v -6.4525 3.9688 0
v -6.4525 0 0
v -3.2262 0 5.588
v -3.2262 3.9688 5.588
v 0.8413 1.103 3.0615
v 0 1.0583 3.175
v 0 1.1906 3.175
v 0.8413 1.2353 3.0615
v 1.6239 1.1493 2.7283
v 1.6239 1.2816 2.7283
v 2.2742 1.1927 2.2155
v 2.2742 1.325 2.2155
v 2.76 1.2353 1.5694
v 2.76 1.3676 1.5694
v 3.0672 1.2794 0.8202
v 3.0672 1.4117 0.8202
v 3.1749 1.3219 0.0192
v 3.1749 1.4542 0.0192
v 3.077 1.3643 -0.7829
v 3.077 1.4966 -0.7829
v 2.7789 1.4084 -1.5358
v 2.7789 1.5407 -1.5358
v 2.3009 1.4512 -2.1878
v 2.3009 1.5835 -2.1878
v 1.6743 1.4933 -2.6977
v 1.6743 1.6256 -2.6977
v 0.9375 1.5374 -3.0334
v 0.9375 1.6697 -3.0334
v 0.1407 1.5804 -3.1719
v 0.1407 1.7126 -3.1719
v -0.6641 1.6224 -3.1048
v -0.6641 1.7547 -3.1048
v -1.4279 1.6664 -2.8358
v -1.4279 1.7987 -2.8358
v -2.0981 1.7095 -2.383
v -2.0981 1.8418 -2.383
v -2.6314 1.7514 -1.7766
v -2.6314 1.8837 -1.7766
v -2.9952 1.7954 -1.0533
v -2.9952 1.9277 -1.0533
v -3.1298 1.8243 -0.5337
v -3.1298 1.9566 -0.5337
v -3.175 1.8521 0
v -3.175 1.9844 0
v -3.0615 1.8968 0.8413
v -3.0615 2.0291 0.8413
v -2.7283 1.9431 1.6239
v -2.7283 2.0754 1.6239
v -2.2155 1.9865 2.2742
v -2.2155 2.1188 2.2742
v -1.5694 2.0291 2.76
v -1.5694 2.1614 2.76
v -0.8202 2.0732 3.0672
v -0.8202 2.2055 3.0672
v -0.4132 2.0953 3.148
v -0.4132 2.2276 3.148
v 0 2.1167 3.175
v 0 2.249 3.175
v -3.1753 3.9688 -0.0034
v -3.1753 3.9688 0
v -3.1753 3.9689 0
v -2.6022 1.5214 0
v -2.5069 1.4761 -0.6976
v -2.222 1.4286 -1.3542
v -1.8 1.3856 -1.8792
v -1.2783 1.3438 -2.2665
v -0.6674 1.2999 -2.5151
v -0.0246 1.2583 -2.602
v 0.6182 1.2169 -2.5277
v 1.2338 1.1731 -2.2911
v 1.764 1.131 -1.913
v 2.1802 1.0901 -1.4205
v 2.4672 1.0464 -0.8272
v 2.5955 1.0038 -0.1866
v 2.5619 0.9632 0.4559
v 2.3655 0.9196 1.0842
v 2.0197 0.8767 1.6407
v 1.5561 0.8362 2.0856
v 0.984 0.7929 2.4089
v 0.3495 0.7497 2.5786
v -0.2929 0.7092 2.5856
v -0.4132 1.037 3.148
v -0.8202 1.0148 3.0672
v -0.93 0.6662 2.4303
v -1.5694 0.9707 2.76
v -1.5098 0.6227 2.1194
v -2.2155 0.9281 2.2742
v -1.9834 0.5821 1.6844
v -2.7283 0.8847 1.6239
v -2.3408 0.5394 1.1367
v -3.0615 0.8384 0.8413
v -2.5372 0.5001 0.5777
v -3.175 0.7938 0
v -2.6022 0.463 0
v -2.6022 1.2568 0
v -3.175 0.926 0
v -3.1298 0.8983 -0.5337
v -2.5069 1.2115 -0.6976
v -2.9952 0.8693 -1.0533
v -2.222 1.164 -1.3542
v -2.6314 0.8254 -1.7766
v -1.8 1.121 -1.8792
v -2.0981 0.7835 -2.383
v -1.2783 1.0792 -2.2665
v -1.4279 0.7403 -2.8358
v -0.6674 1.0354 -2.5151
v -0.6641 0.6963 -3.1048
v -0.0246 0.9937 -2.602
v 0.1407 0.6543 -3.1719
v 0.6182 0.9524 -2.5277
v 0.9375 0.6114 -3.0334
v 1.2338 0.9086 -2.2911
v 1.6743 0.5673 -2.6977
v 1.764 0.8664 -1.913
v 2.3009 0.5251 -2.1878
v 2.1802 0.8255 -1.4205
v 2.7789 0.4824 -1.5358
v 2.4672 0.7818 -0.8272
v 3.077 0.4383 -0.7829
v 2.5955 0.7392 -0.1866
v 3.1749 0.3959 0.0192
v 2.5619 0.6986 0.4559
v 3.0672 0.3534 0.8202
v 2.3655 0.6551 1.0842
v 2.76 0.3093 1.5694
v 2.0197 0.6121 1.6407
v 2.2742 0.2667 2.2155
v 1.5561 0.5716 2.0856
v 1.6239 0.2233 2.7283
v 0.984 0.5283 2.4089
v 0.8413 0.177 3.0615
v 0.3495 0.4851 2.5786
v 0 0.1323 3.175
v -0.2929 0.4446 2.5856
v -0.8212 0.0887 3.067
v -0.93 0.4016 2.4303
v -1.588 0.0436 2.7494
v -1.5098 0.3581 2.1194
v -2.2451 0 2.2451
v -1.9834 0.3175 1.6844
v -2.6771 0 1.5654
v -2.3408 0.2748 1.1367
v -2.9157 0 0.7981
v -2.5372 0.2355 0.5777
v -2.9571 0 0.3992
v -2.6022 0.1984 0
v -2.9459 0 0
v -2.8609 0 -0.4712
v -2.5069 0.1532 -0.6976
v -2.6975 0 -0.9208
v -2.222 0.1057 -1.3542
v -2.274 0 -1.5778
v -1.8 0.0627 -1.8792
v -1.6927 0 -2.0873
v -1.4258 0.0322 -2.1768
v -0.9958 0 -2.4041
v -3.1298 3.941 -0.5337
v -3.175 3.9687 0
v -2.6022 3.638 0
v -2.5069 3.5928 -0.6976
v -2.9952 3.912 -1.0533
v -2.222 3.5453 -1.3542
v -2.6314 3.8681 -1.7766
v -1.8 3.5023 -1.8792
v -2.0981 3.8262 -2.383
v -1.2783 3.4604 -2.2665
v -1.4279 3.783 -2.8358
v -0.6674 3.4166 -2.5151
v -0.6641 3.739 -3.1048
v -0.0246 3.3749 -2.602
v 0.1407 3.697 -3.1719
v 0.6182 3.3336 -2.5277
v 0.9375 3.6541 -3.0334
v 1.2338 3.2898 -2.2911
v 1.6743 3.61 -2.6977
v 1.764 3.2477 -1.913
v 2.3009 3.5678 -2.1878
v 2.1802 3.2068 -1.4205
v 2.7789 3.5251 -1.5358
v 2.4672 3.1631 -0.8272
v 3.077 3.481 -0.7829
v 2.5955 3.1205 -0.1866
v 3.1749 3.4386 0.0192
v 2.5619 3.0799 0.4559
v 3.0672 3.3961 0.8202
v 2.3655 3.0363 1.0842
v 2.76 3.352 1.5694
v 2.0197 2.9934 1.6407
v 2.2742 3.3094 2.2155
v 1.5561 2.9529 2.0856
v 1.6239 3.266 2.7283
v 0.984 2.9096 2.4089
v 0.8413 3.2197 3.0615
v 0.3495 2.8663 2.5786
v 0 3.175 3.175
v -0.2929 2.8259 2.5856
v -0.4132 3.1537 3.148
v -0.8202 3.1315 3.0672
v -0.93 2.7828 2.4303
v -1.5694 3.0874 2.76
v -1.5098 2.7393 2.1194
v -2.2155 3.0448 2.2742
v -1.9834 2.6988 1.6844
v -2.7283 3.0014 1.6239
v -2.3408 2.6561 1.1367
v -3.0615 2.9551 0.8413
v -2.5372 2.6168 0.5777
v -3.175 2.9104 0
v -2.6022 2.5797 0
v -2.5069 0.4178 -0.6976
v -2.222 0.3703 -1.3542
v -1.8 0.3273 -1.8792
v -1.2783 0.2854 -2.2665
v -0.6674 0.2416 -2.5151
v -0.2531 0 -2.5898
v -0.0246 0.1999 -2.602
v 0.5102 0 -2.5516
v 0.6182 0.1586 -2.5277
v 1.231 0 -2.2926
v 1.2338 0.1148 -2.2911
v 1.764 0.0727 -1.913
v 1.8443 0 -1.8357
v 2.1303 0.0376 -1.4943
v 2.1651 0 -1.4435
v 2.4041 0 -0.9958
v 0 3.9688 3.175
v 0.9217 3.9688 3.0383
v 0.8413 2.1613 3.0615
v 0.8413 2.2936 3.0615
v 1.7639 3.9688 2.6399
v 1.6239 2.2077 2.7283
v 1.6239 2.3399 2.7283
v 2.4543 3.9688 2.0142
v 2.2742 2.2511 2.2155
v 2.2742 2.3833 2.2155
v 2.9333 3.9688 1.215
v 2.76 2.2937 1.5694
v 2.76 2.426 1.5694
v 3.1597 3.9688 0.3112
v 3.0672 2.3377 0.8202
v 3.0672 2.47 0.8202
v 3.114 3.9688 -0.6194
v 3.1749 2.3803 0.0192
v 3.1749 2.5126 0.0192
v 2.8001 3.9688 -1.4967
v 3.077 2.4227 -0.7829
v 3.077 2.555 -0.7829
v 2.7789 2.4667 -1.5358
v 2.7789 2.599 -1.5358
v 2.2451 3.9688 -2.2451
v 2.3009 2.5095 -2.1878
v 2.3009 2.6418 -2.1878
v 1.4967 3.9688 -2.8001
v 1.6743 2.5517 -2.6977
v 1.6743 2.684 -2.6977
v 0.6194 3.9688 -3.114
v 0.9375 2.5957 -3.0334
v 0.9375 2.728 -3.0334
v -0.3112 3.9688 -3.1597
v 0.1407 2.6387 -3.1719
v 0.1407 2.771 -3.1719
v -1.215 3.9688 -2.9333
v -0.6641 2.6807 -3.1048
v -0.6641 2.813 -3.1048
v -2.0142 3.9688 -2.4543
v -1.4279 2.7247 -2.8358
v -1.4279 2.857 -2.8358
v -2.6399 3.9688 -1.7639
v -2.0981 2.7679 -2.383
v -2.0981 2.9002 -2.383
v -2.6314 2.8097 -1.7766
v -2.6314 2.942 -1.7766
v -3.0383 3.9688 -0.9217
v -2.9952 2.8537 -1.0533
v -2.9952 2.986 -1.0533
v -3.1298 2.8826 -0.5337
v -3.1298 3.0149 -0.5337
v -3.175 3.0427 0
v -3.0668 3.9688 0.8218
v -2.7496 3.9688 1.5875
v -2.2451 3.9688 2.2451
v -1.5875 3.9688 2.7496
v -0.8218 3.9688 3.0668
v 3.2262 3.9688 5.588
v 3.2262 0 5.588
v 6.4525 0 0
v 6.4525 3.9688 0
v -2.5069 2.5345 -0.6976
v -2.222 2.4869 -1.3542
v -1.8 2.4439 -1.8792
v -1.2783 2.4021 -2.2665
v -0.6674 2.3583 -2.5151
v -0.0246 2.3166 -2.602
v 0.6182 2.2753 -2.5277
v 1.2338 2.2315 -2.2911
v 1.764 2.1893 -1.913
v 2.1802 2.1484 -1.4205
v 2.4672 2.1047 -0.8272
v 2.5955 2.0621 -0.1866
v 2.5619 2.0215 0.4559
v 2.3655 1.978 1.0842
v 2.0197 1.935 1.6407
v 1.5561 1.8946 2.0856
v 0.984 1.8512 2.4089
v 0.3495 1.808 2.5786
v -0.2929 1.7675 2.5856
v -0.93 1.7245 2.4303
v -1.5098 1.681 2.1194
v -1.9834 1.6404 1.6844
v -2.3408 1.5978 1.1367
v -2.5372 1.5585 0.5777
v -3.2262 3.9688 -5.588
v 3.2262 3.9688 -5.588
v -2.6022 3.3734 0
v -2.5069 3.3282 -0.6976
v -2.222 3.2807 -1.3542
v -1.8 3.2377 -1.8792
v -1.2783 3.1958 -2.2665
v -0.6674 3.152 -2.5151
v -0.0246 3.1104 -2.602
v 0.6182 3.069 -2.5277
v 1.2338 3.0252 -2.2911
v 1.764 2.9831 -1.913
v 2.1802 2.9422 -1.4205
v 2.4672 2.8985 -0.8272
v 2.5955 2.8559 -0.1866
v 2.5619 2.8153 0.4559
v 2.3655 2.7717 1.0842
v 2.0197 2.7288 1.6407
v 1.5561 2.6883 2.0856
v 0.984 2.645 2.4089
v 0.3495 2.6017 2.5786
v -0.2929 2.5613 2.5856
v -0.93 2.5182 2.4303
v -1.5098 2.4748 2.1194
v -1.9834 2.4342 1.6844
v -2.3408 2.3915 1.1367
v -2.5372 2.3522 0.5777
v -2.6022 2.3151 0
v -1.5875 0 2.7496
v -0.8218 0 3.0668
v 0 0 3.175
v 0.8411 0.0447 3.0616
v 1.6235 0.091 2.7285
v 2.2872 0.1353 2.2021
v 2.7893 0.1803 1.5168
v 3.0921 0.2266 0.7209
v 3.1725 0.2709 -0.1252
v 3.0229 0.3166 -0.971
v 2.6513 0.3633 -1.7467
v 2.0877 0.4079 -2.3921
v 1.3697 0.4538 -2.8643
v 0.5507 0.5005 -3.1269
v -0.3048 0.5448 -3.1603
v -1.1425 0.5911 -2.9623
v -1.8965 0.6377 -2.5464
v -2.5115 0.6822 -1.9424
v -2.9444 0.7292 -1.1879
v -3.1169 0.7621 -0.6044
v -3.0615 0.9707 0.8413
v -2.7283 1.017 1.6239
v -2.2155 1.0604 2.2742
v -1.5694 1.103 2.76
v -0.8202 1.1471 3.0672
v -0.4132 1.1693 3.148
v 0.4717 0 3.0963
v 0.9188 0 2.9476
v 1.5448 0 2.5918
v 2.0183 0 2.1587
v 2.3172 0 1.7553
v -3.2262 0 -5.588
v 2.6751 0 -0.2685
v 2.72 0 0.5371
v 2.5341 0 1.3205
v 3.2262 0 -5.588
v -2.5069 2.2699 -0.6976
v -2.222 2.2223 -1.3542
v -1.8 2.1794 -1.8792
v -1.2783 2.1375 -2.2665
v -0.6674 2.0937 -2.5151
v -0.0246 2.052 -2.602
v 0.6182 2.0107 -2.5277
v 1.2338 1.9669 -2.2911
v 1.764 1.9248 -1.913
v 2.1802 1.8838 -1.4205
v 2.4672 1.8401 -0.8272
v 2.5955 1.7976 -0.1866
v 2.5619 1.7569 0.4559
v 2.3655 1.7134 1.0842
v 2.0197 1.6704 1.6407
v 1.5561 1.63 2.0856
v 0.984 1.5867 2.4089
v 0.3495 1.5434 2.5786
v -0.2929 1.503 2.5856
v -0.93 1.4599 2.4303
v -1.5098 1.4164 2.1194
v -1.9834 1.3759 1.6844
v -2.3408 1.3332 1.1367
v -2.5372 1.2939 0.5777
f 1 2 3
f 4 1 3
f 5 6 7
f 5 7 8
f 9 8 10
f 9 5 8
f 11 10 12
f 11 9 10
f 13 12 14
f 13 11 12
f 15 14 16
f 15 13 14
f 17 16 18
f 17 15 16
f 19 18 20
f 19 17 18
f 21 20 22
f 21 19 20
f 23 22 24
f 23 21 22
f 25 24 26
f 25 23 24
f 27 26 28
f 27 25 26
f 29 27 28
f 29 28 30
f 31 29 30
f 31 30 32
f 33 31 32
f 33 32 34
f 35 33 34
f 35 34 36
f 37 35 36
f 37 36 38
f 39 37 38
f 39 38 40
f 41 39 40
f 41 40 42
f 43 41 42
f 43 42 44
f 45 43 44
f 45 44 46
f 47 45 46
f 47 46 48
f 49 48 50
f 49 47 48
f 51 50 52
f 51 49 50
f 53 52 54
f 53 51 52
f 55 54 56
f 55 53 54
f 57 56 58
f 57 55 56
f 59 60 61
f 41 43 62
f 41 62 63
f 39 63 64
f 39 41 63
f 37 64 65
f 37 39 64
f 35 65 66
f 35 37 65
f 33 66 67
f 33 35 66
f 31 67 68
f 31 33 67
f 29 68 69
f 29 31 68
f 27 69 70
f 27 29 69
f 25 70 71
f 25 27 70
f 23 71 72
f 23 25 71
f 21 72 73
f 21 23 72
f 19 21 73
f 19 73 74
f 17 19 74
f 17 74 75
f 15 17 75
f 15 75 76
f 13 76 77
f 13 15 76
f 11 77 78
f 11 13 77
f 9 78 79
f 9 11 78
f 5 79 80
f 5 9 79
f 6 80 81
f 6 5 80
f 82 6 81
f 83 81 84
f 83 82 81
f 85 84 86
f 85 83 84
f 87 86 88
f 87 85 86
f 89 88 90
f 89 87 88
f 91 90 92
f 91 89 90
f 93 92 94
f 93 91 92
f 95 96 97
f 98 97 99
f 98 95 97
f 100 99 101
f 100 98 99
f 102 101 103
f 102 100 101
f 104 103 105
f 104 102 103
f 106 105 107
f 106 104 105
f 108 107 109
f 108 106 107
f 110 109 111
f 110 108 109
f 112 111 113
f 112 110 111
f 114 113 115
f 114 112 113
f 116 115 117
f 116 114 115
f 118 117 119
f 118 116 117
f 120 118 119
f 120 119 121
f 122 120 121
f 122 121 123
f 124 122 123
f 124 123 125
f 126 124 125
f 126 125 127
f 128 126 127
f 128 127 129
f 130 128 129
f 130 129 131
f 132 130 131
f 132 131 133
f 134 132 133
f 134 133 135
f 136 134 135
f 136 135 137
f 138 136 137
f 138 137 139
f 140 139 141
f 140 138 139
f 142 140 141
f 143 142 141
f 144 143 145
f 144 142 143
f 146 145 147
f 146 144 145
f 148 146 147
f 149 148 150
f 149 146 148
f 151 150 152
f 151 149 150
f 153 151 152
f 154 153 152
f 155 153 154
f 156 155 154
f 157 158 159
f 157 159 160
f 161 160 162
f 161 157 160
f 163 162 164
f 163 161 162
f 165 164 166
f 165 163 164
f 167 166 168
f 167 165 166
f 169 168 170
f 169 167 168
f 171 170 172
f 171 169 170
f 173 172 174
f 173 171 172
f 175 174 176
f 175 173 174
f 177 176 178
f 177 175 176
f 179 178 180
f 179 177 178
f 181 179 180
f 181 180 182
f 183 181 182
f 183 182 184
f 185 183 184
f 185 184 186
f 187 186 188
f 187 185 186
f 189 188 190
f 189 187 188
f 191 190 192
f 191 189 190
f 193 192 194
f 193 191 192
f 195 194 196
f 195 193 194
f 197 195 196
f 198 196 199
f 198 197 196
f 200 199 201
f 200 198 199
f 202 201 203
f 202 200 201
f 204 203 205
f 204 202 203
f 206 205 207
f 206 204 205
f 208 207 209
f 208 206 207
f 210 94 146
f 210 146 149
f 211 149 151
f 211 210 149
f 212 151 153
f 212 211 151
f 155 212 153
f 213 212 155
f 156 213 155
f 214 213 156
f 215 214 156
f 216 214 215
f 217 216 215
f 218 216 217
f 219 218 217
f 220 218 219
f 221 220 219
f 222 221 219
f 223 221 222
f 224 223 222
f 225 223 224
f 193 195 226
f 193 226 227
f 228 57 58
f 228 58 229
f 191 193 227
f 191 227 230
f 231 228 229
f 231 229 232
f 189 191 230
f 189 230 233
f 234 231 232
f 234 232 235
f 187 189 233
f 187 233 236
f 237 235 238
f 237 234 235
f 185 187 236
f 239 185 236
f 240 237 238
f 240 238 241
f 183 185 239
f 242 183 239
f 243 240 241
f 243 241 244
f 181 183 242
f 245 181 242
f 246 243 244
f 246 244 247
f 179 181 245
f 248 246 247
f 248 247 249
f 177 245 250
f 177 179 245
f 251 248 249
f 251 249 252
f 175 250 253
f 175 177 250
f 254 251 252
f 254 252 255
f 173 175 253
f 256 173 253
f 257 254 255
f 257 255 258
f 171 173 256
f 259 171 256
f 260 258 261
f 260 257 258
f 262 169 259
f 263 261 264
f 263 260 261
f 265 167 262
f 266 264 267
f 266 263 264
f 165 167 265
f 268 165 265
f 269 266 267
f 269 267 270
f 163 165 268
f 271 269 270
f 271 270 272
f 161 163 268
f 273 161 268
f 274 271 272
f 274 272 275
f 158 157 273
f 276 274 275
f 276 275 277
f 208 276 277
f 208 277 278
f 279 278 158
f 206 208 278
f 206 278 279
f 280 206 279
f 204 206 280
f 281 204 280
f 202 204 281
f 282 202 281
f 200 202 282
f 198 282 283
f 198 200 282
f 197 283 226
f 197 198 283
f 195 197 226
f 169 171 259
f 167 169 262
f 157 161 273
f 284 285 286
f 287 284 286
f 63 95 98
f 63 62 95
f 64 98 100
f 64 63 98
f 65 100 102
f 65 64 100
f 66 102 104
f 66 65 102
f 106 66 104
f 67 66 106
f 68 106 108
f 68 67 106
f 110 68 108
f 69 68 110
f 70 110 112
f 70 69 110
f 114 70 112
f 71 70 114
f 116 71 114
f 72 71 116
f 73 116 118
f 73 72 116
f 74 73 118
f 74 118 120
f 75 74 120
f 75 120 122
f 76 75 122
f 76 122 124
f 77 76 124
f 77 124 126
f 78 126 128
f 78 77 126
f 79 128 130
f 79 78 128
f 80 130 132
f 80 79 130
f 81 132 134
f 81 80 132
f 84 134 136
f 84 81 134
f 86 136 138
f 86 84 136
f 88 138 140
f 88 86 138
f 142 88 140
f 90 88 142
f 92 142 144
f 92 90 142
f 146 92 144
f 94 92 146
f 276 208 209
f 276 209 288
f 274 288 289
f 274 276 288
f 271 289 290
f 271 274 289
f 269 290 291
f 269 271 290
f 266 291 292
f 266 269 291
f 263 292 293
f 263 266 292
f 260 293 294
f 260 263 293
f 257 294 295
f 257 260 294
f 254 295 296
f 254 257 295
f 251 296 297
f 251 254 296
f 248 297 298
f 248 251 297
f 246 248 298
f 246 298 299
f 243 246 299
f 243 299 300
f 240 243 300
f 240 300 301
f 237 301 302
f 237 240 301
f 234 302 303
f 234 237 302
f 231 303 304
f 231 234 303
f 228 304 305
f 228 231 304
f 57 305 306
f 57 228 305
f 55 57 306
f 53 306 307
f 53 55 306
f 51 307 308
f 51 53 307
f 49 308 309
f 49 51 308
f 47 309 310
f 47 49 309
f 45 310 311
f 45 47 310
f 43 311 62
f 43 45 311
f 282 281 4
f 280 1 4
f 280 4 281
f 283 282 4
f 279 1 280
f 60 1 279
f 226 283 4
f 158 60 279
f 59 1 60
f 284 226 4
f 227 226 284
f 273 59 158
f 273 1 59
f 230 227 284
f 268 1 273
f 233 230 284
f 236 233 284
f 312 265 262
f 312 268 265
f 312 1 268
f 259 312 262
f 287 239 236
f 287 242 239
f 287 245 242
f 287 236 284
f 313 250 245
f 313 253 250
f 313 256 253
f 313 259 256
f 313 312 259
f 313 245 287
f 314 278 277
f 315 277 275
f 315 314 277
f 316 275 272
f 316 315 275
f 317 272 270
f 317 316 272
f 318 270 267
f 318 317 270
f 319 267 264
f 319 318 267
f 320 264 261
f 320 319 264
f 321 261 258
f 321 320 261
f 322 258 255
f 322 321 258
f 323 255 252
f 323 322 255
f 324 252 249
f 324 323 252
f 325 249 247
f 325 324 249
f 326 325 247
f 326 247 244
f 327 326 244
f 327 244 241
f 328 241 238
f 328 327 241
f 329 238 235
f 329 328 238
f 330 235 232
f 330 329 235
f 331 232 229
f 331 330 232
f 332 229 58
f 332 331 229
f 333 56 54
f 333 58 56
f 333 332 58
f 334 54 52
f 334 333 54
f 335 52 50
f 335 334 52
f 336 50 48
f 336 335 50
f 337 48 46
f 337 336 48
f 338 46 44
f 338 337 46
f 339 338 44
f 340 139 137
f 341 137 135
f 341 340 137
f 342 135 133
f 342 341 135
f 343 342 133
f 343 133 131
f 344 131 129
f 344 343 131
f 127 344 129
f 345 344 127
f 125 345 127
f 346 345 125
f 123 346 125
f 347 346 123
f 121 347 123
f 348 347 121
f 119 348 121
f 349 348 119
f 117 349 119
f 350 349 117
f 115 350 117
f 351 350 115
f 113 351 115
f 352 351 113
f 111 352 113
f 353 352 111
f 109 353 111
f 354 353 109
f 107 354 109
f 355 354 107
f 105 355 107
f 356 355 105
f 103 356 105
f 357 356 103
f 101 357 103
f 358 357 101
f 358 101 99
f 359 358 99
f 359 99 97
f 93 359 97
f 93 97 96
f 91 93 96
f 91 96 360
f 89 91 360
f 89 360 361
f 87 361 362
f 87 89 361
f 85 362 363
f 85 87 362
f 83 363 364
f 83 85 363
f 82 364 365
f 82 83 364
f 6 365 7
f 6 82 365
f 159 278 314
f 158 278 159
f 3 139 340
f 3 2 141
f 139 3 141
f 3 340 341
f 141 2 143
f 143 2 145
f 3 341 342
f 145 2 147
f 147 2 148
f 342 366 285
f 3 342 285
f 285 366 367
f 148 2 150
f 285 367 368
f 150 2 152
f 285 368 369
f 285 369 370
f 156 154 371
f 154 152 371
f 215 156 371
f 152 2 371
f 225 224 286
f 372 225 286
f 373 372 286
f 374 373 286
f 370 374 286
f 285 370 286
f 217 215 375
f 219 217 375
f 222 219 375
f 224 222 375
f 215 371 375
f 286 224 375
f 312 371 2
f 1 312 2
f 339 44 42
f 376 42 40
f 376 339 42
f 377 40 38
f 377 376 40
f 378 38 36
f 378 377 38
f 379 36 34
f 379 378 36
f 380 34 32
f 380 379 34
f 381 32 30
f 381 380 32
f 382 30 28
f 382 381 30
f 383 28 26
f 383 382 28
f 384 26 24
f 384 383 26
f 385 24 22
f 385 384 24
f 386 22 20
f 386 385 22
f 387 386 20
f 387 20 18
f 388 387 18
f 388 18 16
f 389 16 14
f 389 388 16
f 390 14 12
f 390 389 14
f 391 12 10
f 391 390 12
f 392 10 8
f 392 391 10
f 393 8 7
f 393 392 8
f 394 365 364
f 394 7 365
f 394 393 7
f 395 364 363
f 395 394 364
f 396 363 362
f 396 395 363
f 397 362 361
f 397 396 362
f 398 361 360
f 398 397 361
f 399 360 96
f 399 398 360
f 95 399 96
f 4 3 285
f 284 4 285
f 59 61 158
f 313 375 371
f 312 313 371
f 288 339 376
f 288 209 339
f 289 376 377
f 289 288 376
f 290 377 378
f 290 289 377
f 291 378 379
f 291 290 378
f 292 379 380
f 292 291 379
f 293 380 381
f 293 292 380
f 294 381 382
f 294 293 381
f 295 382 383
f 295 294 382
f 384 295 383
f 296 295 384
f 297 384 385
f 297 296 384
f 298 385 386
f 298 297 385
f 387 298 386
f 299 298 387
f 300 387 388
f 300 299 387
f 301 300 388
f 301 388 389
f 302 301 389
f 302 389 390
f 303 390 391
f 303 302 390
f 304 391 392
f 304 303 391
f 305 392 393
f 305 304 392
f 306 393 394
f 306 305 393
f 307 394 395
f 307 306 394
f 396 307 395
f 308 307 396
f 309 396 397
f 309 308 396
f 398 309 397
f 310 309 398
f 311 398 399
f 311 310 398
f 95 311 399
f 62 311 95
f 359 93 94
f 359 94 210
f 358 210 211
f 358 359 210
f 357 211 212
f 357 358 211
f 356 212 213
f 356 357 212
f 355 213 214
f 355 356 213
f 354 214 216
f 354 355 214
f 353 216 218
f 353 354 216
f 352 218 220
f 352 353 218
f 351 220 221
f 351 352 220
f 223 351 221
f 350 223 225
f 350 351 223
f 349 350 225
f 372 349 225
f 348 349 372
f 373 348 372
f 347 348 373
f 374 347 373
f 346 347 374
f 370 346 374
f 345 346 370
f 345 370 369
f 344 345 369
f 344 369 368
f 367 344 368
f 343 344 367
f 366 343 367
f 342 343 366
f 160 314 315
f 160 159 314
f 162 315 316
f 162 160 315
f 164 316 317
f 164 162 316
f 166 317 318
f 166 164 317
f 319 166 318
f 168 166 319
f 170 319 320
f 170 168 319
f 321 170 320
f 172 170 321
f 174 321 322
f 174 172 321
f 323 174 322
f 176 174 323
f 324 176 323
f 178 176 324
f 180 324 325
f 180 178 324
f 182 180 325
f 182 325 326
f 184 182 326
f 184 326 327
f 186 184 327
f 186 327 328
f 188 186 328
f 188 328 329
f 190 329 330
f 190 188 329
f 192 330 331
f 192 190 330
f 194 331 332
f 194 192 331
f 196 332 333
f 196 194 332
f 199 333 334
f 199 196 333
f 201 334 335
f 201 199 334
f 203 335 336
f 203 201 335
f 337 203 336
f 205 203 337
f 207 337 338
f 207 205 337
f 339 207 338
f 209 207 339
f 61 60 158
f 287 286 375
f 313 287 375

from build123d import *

# Parameters (mm, degrees)
SKETCH1_R           = 3.175
BOSS_EXTRUDE3_DEPTH = 3.96875
THREAD1_PITCH       = 1.058333333
SKETCH5_W           = 11.495261482
SKETCH5_H           = 9.373628012
CUT_EXTRUDE1_DEPTH  = 3.96875


with BuildPart() as part:
    # Sketch1 → Boss-Extrude3 (new body)
    with BuildSketch(Plane(origin=(0, 0, 0), x_dir=(1, 0, 0), z_dir=(0, 1, 0))):
        Polygon((-3.226233304, -5.588), (3.226233304, -5.588), (6.452466608, 0), (3.226233304, 5.588), (-3.226233304, 5.588), (-6.452466608, 0), align=None)
        with Locations(Location((0, 0, 0), (0, 0, 270))):
            Circle(SKETCH1_R, mode=Mode.SUBTRACT)
    extrude(amount=BOSS_EXTRUDE3_DEPTH)

    # Thread1: the profile of Thread Profile1 profile screwed along a right-hand helix of 3.75 turns, 8 arcs to a turn; built about Z, then put on its axis
    thread1_z = Axis((0, 0, 0), (0, 0, 1))
    thread1_corners = [(3.1753, 0, -0.000173205), (3.1753, 0, 0.926214869), (2.602160282, 0, 0.595312499), (2.602160282, 0, 0.330729165)]
    with BuildLine(mode=Mode.PRIVATE) as thread1_profile:
        Line(thread1_corners[0], thread1_corners[1])
        Line(thread1_corners[1], thread1_corners[2])
        Line(thread1_corners[2], thread1_corners[3])
        Line(thread1_corners[3], thread1_corners[0])
    thread1_cap = Face(thread1_profile.wire())
    thread1_turn_angles = [0, 22.5, 45, 67.5, 90, 112.5, 135, 157.5, 180, 202.5, 225, 247.5, 270, 292.5, 315, 337.5, 360]
    thread1_turn_weights = [1, 0.9238795325112867, 1, 0.9238795325112867, 1, 0.9238795325112867, 1, 0.9238795325112867, 1, 0.9238795325112867, 1, 0.9238795325112867, 1, 0.9238795325112867, 1, 0.9238795325112867, 1]
    thread1_turn_rails = [Edge.make_bspline([Vector(p[0], p[1], 0).rotate(thread1_z, thread1_turn_angles[k]) / thread1_turn_weights[k] + Vector(0, 0, p[2] + THREAD1_PITCH * thread1_turn_angles[k] / 360) for k in range(17)], [0, 0, 0, 1, 1, 2, 2, 3, 3, 4, 4, 5, 5, 6, 6, 7, 7, 8, 8, 8], 2, thread1_turn_weights) for p in thread1_corners]
    thread1_turn_sides = [Face.make_surface_from_curves(thread1_turn_rails[p[0]], thread1_turn_rails[p[1]]) for p in [(0, 1), (1, 2), (2, 3), (3, 0)]]
    thread1_last_angles = [1080, 1102.5, 1125, 1147.5, 1170, 1192.5, 1215, 1237.5, 1260, 1282.5, 1305, 1327.5, 1350]
    thread1_last_weights = [1, 0.9238795325112867, 1, 0.9238795325112867, 1, 0.9238795325112867, 1, 0.9238795325112867, 1, 0.9238795325112867, 1, 0.923879532511286, 1]
    thread1_last_rails = [Edge.make_bspline([Vector(p[0], p[1], 0).rotate(thread1_z, thread1_last_angles[k]) / thread1_last_weights[k] + Vector(0, 0, p[2] + THREAD1_PITCH * thread1_last_angles[k] / 360) for k in range(13)], [0, 0, 0, 1, 1, 2, 2, 3, 3, 4, 4, 5, 5, 6, 6, 6], 2, thread1_last_weights) for p in thread1_corners]
    thread1_last_sides = [Face.make_surface_from_curves(thread1_last_rails[p[0]], thread1_last_rails[p[1]]) for p in [(0, 1), (1, 2), (2, 3), (3, 0)]]
    thread1 = Plane(origin=(0, 3.96875, 0), x_dir=(-1, 0, 0), z_dir=(0, -1, 0)) * Solid(Shell([*[p.moved(Location((0, 0, THREAD1_PITCH * i))) for i in range(3) for p in thread1_turn_sides], *thread1_last_sides, thread1_cap, thread1_cap.rotate(thread1_z, 1350).moved(Location((0, 0, THREAD1_PITCH * 1350 / 360)))]))
    add(thread1)

    # Sketch5 → Cut-Extrude1 (cut)
    with BuildSketch(Plane(origin=(0, 0, 0), x_dir=(-1, 0, 0), z_dir=(0, -1, 0))):
        with Locations((0.048050932, -0.317875398)):
            Rectangle(SKETCH5_W, SKETCH5_H)
    extrude(amount=CUT_EXTRUDE1_DEPTH, mode=Mode.SUBTRACT)


solid = part.part
